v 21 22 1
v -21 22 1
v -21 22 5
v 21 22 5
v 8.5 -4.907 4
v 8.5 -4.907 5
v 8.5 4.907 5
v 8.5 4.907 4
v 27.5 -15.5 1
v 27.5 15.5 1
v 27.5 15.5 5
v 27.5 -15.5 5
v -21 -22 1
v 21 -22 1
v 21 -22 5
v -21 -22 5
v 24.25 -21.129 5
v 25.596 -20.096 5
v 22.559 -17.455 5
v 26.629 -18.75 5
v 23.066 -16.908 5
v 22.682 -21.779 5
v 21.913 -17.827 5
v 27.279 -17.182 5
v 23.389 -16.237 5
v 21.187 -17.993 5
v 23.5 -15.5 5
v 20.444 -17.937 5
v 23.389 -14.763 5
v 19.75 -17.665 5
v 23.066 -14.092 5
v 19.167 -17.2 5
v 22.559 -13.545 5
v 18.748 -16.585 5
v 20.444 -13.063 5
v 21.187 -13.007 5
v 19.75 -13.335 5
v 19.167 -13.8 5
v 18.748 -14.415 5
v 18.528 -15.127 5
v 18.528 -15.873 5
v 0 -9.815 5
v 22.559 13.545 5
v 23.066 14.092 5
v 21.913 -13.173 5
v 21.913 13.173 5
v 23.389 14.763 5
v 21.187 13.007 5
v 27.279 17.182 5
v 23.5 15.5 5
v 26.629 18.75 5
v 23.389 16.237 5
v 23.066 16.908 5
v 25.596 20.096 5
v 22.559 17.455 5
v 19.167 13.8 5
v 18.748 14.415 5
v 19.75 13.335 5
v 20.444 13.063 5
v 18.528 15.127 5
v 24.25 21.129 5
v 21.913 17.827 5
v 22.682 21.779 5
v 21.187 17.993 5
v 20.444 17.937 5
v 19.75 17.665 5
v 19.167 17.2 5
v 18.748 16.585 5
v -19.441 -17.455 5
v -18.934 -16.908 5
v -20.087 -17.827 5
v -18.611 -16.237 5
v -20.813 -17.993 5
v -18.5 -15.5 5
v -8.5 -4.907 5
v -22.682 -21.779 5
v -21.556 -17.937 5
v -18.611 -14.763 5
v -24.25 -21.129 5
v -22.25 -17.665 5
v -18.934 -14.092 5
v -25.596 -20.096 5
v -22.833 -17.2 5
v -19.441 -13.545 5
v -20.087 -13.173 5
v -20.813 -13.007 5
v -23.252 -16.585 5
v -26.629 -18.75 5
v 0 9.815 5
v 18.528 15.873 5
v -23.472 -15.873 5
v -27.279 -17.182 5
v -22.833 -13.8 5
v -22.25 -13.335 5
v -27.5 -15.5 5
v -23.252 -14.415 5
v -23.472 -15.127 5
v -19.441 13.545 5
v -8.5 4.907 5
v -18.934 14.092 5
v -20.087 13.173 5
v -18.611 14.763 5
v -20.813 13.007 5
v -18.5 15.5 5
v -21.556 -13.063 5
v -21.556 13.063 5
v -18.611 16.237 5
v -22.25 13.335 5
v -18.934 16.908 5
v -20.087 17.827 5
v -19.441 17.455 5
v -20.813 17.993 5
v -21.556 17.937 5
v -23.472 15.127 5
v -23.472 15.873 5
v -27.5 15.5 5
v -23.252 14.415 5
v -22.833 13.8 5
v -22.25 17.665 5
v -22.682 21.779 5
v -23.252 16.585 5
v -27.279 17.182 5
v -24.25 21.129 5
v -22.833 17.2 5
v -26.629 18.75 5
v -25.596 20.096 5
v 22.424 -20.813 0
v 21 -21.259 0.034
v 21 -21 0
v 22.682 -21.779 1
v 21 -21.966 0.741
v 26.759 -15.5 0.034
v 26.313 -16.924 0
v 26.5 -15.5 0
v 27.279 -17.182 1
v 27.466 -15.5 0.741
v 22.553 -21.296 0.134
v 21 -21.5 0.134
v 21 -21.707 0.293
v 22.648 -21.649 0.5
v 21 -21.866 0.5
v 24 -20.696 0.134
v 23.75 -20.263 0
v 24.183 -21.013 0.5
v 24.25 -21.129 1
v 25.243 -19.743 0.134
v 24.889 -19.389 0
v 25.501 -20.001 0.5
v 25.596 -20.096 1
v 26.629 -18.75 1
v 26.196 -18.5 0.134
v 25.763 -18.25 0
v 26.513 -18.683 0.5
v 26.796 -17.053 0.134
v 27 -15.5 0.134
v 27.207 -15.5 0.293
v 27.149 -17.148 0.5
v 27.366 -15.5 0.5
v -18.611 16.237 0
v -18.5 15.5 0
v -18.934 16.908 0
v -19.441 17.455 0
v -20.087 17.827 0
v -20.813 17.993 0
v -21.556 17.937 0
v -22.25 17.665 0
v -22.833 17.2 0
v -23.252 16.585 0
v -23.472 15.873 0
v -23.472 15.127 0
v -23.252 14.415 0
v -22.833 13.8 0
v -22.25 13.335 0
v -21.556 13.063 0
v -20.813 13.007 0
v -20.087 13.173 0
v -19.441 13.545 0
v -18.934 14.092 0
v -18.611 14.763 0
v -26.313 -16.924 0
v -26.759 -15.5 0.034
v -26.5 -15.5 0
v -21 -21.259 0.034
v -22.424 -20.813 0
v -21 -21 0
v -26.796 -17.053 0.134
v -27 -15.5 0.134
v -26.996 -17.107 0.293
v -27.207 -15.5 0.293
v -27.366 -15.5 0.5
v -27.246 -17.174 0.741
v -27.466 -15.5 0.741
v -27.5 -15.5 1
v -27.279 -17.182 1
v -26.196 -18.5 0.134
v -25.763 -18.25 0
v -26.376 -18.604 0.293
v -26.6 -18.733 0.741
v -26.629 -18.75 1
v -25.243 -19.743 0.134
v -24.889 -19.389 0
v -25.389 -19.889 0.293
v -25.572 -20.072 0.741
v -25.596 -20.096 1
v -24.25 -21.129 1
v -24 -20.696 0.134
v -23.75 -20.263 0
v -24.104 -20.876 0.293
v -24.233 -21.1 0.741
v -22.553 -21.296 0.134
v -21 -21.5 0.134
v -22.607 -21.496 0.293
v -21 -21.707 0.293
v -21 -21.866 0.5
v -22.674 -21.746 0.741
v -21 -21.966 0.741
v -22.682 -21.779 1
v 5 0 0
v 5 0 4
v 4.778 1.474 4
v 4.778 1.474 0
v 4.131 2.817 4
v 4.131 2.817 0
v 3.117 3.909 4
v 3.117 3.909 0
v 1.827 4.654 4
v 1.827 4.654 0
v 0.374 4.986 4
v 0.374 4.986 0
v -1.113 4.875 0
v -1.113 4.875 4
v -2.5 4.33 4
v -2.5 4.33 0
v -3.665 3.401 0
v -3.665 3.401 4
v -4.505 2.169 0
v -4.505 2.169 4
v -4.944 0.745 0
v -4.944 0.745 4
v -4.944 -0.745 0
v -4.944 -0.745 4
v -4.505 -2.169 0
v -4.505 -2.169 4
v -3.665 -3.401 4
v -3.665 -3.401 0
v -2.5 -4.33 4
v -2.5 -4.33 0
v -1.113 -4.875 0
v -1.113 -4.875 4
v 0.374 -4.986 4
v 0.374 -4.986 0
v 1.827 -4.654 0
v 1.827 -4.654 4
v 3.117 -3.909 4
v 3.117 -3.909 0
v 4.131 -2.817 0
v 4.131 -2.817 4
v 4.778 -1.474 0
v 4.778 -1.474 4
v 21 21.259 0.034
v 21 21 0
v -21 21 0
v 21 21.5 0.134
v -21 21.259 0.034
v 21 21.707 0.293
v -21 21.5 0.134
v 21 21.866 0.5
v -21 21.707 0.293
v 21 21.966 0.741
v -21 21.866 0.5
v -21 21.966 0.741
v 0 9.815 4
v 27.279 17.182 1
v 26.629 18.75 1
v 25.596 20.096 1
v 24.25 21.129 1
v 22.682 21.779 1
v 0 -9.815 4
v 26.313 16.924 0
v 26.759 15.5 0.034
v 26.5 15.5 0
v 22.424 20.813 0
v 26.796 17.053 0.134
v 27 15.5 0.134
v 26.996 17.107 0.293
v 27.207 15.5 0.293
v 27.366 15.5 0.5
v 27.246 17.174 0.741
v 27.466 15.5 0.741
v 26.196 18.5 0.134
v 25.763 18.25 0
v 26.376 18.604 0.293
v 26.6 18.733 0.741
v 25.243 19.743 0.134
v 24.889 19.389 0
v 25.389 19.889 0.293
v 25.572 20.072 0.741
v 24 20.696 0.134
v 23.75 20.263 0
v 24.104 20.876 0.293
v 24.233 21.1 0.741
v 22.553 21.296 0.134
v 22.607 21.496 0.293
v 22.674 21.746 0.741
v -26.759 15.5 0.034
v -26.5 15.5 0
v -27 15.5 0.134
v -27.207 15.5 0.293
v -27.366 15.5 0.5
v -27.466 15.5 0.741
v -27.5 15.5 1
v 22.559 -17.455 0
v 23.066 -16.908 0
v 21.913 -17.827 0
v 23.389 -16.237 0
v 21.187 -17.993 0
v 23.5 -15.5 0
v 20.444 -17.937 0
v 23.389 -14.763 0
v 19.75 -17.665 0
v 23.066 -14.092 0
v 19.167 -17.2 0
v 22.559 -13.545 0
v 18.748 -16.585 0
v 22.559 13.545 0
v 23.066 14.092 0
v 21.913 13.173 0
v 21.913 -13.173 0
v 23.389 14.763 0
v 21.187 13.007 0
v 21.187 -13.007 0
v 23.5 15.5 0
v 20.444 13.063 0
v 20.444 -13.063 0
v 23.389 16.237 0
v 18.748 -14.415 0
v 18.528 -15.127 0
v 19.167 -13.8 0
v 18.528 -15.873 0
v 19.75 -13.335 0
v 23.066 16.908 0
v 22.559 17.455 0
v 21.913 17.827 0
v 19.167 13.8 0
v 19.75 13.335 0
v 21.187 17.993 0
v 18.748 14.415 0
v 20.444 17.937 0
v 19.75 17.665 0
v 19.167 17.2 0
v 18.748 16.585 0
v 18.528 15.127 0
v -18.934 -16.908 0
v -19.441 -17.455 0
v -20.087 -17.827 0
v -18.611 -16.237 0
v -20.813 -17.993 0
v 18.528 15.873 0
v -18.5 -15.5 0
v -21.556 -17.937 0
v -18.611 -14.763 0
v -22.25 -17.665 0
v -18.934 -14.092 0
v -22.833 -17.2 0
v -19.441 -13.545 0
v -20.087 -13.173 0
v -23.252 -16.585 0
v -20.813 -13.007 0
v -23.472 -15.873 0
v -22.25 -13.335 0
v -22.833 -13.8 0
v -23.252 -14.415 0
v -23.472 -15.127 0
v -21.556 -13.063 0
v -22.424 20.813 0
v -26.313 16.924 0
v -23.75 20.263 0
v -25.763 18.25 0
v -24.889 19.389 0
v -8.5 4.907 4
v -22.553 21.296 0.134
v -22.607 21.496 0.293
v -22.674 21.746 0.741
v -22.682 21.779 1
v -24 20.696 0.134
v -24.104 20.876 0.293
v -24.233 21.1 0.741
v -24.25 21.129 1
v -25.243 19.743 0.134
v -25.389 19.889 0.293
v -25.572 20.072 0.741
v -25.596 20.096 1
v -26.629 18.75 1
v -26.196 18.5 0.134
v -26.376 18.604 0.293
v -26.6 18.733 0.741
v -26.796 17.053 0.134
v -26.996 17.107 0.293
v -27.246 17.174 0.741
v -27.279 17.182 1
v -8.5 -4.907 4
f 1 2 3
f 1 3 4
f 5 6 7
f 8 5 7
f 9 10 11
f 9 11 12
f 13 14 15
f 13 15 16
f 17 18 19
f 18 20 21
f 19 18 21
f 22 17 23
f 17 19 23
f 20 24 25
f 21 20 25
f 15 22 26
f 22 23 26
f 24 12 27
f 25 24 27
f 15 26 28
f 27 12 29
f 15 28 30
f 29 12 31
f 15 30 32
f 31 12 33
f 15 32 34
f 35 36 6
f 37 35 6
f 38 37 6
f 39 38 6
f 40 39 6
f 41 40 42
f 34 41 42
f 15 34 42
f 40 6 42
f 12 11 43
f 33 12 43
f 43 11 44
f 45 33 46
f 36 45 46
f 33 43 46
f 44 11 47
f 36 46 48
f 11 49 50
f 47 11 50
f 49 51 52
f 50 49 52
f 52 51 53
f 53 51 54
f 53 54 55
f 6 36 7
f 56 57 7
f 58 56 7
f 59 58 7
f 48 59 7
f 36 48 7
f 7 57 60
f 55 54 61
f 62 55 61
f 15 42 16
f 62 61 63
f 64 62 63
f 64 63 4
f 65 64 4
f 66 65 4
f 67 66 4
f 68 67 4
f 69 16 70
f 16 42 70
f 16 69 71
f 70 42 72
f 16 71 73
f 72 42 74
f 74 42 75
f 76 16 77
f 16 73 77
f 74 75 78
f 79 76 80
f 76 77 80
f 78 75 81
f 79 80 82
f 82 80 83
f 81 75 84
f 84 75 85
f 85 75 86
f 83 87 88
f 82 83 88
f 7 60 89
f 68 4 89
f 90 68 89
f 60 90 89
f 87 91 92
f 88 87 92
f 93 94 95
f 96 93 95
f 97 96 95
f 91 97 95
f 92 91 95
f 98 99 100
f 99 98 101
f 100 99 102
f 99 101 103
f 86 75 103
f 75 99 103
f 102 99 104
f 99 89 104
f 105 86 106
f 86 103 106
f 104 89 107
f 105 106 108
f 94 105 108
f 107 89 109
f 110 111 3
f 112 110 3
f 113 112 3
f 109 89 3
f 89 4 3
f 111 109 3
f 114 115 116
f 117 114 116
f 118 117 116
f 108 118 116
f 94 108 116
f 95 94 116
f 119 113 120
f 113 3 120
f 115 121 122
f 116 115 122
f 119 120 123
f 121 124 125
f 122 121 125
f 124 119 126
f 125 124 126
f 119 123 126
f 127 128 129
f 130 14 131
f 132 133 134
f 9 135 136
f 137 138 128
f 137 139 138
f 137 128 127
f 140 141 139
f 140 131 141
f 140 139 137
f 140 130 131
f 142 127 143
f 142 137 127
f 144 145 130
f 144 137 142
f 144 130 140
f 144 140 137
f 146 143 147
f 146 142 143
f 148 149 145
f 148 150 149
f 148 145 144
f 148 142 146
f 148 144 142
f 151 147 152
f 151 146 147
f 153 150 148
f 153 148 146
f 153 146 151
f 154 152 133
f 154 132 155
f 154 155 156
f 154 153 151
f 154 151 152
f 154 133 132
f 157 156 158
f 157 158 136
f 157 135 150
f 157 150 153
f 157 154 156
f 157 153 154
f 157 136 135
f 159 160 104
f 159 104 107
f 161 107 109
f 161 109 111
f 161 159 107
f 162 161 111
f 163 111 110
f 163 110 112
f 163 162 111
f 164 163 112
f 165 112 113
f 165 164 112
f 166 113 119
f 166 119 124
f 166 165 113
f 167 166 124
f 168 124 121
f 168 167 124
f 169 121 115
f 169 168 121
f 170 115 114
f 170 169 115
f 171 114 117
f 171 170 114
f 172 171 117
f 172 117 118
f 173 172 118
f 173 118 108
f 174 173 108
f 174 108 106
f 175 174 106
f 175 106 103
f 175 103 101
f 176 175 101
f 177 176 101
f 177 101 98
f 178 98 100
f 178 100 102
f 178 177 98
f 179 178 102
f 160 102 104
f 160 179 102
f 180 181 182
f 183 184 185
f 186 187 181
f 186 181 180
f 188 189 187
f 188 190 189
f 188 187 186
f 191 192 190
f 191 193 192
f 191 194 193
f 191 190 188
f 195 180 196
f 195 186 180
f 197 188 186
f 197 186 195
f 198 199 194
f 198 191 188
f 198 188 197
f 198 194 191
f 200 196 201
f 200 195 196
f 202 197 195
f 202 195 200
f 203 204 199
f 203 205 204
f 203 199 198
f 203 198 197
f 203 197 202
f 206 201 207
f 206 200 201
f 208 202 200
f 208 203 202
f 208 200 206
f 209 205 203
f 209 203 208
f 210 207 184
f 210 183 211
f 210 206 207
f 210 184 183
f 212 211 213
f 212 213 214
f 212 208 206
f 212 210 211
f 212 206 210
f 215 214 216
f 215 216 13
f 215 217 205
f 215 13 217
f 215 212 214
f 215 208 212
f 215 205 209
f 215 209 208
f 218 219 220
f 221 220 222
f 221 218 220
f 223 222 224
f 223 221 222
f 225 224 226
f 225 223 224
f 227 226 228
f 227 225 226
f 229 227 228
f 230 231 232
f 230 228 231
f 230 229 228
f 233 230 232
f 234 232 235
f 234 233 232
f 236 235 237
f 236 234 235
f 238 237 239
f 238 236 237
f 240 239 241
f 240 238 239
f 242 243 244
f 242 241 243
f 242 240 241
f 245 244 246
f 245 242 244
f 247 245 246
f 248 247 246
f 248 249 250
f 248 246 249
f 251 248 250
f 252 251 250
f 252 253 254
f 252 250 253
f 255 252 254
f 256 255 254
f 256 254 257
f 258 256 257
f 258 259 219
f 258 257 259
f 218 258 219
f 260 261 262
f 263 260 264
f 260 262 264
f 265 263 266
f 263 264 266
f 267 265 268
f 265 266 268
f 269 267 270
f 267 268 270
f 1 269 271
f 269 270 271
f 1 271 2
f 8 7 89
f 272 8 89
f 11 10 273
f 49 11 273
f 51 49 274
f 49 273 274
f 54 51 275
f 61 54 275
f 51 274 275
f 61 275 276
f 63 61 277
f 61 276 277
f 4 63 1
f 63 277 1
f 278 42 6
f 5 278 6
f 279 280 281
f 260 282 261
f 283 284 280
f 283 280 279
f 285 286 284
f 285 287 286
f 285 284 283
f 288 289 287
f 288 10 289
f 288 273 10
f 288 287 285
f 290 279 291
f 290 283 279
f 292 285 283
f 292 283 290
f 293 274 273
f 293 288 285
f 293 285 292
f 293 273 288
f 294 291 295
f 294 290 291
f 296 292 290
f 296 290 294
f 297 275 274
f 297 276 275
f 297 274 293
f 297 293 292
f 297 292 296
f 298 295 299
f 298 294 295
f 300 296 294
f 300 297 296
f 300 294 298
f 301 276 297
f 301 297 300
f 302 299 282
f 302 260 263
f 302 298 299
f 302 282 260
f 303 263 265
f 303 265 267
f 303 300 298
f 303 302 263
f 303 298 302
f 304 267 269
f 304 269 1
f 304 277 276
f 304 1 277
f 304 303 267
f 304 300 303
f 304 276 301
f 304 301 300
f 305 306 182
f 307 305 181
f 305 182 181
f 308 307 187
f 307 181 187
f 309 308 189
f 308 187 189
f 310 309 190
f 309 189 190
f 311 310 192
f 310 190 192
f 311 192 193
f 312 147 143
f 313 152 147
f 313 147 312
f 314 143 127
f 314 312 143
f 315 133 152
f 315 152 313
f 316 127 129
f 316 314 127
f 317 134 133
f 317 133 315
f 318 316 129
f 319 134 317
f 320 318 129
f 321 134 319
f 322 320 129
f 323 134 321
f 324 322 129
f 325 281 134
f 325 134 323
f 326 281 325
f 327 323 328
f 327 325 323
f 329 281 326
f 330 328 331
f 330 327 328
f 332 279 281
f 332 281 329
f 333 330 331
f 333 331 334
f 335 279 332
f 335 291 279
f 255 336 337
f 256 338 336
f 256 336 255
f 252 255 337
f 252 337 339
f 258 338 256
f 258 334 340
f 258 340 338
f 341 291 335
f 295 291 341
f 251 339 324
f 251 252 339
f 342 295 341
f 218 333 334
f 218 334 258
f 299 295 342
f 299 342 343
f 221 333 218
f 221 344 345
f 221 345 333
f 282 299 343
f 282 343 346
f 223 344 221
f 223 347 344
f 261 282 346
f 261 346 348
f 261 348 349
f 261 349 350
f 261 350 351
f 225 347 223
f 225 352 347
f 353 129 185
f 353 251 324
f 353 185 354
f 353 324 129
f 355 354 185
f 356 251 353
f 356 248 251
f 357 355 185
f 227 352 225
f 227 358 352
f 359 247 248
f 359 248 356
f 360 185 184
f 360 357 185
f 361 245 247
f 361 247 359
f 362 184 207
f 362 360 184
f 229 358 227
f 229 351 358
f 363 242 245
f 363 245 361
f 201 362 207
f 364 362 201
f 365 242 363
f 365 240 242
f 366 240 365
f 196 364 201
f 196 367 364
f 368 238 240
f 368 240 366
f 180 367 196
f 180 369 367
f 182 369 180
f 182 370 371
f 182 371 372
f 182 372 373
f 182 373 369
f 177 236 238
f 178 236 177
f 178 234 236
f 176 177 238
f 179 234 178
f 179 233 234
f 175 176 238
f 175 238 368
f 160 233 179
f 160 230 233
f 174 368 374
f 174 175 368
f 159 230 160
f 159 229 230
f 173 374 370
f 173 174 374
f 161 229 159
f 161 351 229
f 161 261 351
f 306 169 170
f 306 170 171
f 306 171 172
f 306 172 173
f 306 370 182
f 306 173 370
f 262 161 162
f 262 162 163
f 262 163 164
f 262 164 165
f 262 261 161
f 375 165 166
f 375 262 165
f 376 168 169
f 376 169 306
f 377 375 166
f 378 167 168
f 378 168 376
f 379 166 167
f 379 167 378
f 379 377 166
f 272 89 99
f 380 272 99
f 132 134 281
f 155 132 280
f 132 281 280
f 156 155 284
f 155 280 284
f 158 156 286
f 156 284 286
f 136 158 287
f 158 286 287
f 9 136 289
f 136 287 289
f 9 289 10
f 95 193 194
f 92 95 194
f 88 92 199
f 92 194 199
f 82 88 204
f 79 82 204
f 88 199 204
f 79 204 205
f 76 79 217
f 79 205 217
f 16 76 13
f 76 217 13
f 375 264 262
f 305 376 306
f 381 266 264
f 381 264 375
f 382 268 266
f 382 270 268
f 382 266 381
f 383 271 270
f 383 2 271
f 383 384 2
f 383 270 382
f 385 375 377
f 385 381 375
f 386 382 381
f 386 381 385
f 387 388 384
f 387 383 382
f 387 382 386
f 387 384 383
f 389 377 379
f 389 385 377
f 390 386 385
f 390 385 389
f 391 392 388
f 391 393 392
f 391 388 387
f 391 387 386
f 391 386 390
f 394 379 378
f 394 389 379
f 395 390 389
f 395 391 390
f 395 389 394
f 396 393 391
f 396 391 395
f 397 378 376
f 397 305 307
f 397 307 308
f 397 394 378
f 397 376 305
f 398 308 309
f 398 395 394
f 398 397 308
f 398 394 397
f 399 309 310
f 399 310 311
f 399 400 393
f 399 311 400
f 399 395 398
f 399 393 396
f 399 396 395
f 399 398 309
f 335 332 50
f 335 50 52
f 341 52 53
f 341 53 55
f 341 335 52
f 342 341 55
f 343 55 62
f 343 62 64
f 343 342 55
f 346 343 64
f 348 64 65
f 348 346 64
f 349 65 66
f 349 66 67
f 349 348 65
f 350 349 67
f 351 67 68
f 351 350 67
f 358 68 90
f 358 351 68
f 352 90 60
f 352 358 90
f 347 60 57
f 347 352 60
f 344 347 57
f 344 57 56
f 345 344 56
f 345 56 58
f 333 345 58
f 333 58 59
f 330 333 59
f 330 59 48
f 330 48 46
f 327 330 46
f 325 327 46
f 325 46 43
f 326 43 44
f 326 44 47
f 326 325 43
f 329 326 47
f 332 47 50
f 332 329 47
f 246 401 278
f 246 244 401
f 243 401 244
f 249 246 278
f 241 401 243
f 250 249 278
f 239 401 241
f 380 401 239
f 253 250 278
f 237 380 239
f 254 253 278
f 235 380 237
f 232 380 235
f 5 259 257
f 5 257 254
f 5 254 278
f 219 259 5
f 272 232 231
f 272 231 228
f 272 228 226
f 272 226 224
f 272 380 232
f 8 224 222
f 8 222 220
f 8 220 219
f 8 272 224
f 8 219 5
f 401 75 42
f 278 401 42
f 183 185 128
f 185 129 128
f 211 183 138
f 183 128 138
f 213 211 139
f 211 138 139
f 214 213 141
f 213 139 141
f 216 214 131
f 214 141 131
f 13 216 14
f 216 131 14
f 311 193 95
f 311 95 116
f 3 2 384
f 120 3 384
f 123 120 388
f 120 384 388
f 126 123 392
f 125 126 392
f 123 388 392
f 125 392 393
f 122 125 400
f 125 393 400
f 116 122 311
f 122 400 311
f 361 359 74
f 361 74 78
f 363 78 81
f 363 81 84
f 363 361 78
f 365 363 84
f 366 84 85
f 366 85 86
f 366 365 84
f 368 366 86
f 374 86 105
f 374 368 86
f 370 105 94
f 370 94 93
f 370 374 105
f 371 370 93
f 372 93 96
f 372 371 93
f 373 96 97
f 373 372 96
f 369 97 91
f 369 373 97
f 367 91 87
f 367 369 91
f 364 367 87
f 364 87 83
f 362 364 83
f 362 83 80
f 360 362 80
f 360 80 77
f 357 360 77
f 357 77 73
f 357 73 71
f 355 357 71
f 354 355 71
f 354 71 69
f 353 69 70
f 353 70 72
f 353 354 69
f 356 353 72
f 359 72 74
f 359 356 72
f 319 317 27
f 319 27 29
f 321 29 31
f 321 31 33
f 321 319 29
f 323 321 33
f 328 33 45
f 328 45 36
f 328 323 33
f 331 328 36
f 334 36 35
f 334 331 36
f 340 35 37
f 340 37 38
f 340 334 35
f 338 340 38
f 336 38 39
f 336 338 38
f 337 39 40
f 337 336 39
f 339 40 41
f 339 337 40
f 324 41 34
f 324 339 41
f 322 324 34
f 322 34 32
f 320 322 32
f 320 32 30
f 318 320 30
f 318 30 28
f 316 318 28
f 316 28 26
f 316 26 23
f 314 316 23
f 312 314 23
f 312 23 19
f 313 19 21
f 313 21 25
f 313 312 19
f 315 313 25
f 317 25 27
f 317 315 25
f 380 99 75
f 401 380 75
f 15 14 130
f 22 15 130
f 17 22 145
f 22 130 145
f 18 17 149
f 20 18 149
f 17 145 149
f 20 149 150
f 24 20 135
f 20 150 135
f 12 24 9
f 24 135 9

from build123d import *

# Parameters (mm, degrees)
SKETCH_R     = 5
SKETCH_R_2   = 2.5
PAD_DEPTH    = 5
POCKET_DEPTH = 1
FILLET_R     = 1


with BuildPart() as part:
    # Sketch → Pad (new body)
    with BuildSketch(Plane.XY):
        with BuildLine():
            Line((-21, 22), (21, 22))
            ThreePointArc((27.5, 15.5), (25.596194, 20.096194), (21, 22))
            Line((27.5, 15.5), (27.5, -15.5))
            ThreePointArc((21, -22), (25.596194, -20.096194), (27.5, -15.5))
            Line((21, -22), (-21, -22))
            ThreePointArc((-27.5, -15.5), (-25.596194, -20.096194), (-21, -22))
            Line((-27.5, -15.5), (-27.5, 15.5))
            ThreePointArc((-21, 22), (-25.596194, 20.096194), (-27.5, 15.5))
        make_face()
        Circle(SKETCH_R, mode=Mode.SUBTRACT)
        with Locations((-21, 15.5)):
            Circle(SKETCH_R_2, mode=Mode.SUBTRACT)
        with Locations((21, 15.5)):
            Circle(SKETCH_R_2, mode=Mode.SUBTRACT)
        with Locations((21, -15.5)):
            Circle(SKETCH_R_2, mode=Mode.SUBTRACT)
        with Locations((-21, -15.5)):
            Circle(SKETCH_R_2, mode=Mode.SUBTRACT)
    extrude(amount=PAD_DEPTH)

    # Sketch001 (on Face15 of Pad) → Pocket (cut)
    with BuildSketch(Plane.XY.offset(5)):
        Polygon((8.5, 4.907477), (0, 9.814955), (-8.5, 4.907477), (-8.5, -4.907477), (0, -9.814955), (8.5, -4.907477), align=None)
    extrude(amount=-POCKET_DEPTH, mode=Mode.SUBTRACT)

    # Fillet
    fillet_edges = [part.edges().sort_by_distance(p)[0] for p in [
        (25.596194, -20.096194, 0),
        (0, -22, 0),
        (27.5, 0, 0),
        (25.596194, 20.096194, 0),
        (0, 22, 0),
        (-25.596194, 20.096194, 0),
        (-27.5, 0, 0),
        (-25.596194, -20.096194, 0),
    ]]
    fillet(fillet_edges, radius=FILLET_R)


solid = part.part
